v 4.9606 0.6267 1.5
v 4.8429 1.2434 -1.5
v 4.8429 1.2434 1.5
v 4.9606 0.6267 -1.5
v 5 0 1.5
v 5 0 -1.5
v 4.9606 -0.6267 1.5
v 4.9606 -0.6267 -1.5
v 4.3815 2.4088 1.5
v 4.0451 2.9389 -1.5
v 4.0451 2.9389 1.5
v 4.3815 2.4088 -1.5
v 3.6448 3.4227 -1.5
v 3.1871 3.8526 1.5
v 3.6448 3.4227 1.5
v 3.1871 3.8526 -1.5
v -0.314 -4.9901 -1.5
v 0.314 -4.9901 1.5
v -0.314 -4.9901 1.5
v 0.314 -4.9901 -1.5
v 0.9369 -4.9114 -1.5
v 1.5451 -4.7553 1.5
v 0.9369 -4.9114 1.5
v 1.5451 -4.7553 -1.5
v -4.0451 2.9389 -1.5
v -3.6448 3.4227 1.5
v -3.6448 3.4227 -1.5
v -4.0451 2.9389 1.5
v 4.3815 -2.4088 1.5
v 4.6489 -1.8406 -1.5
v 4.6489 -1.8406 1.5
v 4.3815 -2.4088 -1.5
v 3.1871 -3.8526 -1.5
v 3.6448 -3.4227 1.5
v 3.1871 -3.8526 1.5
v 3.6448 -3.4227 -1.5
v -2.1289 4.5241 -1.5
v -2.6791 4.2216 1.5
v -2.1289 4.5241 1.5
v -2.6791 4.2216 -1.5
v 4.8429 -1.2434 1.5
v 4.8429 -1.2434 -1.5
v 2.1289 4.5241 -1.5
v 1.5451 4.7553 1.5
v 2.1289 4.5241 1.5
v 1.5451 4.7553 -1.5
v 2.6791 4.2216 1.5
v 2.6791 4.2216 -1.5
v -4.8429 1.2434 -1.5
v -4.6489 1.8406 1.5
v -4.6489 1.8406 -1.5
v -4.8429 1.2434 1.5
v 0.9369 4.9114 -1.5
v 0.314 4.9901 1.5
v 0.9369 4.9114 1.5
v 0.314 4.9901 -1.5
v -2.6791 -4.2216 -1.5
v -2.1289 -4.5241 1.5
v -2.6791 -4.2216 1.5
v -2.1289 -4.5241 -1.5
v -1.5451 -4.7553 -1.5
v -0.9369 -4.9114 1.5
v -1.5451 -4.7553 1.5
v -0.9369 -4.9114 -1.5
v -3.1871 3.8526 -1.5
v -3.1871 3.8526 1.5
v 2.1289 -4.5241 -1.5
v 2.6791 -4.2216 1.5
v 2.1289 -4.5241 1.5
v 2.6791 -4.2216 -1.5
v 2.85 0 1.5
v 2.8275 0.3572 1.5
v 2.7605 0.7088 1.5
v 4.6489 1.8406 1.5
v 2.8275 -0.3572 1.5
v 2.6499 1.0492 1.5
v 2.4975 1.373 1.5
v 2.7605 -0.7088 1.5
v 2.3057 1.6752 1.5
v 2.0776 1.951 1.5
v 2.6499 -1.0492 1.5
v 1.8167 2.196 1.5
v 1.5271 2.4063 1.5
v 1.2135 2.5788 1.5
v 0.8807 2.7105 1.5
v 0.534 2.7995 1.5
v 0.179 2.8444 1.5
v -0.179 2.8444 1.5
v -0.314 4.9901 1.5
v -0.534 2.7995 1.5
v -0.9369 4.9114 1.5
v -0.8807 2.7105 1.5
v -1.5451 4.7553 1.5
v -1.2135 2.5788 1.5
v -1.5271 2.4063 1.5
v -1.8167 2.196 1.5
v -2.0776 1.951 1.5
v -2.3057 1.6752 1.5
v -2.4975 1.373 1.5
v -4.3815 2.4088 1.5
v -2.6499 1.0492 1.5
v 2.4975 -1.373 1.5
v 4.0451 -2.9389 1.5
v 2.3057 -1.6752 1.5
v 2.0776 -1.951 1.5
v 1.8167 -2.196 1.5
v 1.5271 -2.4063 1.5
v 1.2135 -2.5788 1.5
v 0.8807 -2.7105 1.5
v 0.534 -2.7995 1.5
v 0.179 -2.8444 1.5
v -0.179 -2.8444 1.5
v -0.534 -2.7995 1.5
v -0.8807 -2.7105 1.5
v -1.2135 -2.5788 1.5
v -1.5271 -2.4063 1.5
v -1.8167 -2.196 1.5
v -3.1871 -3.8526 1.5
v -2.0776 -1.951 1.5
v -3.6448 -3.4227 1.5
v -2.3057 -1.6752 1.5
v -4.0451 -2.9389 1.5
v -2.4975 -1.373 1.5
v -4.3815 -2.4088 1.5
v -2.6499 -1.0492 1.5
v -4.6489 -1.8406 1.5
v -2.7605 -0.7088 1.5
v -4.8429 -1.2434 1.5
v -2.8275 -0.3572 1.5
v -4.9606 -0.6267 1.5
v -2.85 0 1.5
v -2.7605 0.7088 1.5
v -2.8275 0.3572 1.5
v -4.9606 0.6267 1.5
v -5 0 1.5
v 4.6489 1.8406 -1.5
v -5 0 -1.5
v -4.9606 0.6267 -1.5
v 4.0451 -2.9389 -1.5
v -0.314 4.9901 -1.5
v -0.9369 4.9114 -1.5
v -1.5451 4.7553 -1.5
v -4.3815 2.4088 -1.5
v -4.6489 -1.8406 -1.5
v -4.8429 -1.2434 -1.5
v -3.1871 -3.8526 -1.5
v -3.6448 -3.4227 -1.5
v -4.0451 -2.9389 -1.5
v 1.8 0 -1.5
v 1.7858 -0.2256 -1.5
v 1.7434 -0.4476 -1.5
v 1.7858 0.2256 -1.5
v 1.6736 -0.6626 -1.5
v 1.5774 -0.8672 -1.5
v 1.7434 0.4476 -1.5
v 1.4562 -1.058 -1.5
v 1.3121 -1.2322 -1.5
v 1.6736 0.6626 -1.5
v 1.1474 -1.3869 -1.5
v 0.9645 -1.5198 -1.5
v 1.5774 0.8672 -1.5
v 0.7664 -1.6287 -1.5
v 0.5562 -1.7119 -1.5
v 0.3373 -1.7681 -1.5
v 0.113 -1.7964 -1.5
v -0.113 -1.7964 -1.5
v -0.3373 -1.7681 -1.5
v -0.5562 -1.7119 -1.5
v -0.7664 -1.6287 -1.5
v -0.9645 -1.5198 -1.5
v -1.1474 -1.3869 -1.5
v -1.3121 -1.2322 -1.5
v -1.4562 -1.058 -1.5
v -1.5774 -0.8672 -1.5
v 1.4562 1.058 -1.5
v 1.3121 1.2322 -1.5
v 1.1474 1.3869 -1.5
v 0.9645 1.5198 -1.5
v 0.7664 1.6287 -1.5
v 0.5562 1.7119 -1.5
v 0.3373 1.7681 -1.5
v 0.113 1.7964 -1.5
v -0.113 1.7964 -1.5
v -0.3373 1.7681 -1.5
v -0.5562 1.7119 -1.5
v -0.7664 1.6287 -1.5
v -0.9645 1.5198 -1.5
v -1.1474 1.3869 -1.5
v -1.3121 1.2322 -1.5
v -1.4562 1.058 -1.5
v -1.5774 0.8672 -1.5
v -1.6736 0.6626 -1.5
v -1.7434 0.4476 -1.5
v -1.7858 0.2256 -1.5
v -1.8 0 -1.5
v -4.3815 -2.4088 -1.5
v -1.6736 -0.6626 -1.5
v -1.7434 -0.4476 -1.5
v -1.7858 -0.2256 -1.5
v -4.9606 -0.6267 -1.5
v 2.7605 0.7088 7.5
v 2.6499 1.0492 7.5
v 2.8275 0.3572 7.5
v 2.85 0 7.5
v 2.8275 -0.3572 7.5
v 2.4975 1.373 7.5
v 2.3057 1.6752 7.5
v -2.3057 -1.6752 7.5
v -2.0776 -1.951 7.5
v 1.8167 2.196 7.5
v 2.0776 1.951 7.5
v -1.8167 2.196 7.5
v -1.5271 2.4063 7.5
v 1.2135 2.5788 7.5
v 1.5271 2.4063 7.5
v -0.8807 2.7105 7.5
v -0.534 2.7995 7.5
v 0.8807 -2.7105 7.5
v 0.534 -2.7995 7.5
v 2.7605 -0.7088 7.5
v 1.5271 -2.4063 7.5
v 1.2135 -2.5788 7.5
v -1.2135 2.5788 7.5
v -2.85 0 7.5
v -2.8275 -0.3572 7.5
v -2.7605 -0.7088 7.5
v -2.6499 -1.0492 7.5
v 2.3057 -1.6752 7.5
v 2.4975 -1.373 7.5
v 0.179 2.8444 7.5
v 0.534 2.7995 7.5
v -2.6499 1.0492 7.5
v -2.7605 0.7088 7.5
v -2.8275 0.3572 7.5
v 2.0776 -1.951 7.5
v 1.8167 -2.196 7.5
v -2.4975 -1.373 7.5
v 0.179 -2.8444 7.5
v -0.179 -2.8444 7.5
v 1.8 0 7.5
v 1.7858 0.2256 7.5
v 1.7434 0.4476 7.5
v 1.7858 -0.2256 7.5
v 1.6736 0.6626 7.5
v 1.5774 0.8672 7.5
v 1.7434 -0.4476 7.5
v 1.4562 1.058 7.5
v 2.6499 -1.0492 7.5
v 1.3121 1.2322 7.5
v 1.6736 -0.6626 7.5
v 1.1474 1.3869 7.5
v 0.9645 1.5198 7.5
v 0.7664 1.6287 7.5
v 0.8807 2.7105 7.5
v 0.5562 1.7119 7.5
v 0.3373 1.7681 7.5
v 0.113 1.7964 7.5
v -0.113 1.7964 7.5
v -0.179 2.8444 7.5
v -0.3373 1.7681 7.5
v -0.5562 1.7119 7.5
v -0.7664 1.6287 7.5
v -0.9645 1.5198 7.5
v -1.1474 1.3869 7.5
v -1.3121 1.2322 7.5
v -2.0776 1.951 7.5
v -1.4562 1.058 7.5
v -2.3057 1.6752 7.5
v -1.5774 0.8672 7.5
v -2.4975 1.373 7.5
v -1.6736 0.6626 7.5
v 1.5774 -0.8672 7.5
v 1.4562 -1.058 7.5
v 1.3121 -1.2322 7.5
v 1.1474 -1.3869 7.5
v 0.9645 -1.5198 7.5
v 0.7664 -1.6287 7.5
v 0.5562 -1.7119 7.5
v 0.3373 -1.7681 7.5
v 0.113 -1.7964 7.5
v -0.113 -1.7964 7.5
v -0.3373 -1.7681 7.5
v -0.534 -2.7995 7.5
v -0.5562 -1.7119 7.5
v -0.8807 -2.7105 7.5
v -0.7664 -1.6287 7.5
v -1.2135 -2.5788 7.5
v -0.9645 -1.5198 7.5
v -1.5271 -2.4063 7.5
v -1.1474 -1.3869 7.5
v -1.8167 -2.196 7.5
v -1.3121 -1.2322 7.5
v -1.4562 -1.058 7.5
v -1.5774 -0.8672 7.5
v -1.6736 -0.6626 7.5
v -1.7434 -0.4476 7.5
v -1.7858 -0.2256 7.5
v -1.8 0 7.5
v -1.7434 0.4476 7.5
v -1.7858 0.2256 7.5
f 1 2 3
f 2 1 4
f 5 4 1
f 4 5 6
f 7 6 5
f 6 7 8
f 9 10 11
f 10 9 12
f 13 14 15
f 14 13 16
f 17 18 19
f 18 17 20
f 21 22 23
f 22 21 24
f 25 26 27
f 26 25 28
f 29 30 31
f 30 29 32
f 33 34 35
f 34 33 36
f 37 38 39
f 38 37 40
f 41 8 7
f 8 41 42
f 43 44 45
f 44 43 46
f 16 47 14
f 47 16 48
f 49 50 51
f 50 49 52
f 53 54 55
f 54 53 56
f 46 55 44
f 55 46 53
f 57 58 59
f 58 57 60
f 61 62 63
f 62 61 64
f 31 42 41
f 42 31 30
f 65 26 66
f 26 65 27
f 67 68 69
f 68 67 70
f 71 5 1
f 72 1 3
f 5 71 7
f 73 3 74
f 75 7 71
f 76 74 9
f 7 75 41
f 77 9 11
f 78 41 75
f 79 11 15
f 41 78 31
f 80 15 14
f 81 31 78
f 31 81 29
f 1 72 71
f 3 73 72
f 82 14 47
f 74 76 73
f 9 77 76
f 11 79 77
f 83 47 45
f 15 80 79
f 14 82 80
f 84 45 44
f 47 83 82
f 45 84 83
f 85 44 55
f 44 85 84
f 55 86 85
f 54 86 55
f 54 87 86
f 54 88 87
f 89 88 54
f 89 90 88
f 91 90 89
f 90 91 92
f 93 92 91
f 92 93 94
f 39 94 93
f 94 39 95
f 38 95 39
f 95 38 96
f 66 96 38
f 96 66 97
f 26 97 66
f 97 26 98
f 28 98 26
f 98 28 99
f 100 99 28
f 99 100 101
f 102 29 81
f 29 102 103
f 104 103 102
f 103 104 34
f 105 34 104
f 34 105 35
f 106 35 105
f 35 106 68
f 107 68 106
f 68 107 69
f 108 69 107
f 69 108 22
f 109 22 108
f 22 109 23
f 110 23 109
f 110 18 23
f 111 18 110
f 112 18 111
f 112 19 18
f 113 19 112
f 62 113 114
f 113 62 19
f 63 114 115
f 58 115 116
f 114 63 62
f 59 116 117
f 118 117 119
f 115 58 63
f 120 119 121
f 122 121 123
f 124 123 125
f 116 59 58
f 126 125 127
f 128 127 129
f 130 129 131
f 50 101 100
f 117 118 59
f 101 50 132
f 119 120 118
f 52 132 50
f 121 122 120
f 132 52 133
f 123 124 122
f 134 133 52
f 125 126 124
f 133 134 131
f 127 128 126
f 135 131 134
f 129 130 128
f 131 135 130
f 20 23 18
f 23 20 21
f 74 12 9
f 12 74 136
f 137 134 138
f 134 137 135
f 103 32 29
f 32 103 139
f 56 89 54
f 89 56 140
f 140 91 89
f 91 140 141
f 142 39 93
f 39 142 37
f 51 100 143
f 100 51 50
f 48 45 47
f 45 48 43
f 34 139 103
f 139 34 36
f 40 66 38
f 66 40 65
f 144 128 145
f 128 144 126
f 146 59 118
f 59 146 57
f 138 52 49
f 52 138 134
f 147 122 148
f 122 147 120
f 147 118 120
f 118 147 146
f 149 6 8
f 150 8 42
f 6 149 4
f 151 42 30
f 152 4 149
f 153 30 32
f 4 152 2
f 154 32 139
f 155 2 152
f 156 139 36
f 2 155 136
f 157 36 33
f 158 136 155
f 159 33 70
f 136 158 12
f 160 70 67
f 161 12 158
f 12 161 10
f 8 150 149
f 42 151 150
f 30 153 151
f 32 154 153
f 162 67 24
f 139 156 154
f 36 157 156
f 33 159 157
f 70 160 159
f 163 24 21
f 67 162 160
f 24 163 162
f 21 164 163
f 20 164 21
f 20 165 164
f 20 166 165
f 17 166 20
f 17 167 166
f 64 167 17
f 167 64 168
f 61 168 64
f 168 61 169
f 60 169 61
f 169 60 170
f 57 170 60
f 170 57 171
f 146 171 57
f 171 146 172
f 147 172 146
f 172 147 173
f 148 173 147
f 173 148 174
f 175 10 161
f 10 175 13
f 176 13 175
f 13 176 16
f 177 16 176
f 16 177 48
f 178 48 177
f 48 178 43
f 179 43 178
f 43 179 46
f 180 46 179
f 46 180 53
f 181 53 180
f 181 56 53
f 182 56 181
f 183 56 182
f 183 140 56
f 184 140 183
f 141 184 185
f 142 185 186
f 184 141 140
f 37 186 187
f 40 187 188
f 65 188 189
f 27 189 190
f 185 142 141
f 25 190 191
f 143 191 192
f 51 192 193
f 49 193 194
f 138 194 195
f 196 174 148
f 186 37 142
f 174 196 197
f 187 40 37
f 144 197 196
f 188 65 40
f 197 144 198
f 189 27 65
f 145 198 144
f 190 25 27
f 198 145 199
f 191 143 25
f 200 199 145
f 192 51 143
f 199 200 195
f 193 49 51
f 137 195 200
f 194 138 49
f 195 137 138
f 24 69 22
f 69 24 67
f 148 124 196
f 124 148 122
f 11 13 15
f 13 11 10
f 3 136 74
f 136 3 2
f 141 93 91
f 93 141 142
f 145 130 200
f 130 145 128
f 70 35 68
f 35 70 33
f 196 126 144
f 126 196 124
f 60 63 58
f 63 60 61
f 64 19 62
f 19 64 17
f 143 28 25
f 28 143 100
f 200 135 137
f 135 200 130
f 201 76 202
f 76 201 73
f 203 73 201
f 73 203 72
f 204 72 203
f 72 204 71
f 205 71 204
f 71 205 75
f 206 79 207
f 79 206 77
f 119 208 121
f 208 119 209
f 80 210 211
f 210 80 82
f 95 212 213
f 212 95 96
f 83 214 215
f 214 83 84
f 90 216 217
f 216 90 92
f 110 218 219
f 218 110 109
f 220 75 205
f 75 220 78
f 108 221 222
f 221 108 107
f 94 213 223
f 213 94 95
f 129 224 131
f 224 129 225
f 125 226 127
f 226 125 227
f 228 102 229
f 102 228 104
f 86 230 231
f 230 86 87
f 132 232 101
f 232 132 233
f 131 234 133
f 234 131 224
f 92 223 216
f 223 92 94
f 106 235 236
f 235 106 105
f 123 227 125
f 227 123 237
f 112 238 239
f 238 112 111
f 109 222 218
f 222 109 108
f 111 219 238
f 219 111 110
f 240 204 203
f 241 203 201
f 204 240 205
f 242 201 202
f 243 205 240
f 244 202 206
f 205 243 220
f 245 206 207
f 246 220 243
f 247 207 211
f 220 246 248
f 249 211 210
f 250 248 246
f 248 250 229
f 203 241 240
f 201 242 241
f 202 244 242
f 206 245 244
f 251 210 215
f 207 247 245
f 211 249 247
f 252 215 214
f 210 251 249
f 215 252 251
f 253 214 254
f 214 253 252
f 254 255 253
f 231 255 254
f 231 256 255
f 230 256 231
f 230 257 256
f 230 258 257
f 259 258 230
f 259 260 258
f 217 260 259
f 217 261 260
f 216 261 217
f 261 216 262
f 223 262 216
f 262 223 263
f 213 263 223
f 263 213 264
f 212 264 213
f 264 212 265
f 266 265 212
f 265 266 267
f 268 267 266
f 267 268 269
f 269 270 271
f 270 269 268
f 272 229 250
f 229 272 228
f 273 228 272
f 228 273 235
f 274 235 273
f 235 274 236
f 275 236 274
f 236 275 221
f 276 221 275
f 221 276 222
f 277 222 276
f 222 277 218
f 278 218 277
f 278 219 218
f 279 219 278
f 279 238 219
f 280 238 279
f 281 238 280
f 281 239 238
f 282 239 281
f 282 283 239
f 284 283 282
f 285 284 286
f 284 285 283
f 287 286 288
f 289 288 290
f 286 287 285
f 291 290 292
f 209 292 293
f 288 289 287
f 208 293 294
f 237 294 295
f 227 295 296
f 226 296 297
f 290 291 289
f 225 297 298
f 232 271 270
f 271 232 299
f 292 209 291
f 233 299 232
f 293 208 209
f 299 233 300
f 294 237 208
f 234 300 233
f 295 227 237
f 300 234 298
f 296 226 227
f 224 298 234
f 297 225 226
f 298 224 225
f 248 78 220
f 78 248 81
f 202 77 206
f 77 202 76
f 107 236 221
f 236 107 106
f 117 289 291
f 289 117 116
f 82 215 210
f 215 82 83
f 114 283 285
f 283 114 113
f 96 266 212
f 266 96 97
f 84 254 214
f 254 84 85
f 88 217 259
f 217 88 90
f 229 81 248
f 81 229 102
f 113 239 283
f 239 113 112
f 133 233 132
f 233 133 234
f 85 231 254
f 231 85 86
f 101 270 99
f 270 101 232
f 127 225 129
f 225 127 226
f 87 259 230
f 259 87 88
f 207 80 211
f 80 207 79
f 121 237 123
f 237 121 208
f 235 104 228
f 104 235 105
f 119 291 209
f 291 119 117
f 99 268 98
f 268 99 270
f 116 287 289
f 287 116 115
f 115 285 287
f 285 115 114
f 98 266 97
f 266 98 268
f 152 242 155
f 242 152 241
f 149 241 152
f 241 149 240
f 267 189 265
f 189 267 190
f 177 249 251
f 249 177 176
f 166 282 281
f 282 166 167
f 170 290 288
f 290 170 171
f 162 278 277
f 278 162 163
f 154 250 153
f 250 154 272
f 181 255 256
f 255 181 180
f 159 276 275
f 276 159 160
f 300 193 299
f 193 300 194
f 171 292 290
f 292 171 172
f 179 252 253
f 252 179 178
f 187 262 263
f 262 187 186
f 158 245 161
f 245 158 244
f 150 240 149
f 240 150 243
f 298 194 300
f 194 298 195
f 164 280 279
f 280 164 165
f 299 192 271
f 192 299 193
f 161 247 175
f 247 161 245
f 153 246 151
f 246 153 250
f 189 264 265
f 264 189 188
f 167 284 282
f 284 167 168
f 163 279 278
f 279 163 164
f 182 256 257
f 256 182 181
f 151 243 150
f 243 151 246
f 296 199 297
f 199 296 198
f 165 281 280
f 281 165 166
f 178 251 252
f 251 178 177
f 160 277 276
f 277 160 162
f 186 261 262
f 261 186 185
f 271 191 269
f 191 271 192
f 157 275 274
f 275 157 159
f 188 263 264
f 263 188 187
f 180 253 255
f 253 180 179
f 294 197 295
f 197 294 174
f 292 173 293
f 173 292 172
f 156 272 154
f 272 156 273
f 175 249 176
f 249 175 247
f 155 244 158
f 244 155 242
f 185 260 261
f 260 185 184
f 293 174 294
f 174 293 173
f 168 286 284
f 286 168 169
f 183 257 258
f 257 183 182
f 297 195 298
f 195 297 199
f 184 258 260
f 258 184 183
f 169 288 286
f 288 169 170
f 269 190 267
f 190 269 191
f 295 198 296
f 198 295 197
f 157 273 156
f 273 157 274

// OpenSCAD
$fn = 50;


difference() {
	union() {
		translate(v = [0, 0, -1.5000000000]) {
			cylinder(h = 3, r = 5.0000000000);
		}
		translate(v = [0, 0, -1.5000000000]) {
			cylinder(h = 9, r = 2.8500000000);
		}
	}
	union() {
		translate(v = [0, 0, -100.0000000000]) {
			cylinder(h = 200, r = 1.8000000000);
		}
	}
}
